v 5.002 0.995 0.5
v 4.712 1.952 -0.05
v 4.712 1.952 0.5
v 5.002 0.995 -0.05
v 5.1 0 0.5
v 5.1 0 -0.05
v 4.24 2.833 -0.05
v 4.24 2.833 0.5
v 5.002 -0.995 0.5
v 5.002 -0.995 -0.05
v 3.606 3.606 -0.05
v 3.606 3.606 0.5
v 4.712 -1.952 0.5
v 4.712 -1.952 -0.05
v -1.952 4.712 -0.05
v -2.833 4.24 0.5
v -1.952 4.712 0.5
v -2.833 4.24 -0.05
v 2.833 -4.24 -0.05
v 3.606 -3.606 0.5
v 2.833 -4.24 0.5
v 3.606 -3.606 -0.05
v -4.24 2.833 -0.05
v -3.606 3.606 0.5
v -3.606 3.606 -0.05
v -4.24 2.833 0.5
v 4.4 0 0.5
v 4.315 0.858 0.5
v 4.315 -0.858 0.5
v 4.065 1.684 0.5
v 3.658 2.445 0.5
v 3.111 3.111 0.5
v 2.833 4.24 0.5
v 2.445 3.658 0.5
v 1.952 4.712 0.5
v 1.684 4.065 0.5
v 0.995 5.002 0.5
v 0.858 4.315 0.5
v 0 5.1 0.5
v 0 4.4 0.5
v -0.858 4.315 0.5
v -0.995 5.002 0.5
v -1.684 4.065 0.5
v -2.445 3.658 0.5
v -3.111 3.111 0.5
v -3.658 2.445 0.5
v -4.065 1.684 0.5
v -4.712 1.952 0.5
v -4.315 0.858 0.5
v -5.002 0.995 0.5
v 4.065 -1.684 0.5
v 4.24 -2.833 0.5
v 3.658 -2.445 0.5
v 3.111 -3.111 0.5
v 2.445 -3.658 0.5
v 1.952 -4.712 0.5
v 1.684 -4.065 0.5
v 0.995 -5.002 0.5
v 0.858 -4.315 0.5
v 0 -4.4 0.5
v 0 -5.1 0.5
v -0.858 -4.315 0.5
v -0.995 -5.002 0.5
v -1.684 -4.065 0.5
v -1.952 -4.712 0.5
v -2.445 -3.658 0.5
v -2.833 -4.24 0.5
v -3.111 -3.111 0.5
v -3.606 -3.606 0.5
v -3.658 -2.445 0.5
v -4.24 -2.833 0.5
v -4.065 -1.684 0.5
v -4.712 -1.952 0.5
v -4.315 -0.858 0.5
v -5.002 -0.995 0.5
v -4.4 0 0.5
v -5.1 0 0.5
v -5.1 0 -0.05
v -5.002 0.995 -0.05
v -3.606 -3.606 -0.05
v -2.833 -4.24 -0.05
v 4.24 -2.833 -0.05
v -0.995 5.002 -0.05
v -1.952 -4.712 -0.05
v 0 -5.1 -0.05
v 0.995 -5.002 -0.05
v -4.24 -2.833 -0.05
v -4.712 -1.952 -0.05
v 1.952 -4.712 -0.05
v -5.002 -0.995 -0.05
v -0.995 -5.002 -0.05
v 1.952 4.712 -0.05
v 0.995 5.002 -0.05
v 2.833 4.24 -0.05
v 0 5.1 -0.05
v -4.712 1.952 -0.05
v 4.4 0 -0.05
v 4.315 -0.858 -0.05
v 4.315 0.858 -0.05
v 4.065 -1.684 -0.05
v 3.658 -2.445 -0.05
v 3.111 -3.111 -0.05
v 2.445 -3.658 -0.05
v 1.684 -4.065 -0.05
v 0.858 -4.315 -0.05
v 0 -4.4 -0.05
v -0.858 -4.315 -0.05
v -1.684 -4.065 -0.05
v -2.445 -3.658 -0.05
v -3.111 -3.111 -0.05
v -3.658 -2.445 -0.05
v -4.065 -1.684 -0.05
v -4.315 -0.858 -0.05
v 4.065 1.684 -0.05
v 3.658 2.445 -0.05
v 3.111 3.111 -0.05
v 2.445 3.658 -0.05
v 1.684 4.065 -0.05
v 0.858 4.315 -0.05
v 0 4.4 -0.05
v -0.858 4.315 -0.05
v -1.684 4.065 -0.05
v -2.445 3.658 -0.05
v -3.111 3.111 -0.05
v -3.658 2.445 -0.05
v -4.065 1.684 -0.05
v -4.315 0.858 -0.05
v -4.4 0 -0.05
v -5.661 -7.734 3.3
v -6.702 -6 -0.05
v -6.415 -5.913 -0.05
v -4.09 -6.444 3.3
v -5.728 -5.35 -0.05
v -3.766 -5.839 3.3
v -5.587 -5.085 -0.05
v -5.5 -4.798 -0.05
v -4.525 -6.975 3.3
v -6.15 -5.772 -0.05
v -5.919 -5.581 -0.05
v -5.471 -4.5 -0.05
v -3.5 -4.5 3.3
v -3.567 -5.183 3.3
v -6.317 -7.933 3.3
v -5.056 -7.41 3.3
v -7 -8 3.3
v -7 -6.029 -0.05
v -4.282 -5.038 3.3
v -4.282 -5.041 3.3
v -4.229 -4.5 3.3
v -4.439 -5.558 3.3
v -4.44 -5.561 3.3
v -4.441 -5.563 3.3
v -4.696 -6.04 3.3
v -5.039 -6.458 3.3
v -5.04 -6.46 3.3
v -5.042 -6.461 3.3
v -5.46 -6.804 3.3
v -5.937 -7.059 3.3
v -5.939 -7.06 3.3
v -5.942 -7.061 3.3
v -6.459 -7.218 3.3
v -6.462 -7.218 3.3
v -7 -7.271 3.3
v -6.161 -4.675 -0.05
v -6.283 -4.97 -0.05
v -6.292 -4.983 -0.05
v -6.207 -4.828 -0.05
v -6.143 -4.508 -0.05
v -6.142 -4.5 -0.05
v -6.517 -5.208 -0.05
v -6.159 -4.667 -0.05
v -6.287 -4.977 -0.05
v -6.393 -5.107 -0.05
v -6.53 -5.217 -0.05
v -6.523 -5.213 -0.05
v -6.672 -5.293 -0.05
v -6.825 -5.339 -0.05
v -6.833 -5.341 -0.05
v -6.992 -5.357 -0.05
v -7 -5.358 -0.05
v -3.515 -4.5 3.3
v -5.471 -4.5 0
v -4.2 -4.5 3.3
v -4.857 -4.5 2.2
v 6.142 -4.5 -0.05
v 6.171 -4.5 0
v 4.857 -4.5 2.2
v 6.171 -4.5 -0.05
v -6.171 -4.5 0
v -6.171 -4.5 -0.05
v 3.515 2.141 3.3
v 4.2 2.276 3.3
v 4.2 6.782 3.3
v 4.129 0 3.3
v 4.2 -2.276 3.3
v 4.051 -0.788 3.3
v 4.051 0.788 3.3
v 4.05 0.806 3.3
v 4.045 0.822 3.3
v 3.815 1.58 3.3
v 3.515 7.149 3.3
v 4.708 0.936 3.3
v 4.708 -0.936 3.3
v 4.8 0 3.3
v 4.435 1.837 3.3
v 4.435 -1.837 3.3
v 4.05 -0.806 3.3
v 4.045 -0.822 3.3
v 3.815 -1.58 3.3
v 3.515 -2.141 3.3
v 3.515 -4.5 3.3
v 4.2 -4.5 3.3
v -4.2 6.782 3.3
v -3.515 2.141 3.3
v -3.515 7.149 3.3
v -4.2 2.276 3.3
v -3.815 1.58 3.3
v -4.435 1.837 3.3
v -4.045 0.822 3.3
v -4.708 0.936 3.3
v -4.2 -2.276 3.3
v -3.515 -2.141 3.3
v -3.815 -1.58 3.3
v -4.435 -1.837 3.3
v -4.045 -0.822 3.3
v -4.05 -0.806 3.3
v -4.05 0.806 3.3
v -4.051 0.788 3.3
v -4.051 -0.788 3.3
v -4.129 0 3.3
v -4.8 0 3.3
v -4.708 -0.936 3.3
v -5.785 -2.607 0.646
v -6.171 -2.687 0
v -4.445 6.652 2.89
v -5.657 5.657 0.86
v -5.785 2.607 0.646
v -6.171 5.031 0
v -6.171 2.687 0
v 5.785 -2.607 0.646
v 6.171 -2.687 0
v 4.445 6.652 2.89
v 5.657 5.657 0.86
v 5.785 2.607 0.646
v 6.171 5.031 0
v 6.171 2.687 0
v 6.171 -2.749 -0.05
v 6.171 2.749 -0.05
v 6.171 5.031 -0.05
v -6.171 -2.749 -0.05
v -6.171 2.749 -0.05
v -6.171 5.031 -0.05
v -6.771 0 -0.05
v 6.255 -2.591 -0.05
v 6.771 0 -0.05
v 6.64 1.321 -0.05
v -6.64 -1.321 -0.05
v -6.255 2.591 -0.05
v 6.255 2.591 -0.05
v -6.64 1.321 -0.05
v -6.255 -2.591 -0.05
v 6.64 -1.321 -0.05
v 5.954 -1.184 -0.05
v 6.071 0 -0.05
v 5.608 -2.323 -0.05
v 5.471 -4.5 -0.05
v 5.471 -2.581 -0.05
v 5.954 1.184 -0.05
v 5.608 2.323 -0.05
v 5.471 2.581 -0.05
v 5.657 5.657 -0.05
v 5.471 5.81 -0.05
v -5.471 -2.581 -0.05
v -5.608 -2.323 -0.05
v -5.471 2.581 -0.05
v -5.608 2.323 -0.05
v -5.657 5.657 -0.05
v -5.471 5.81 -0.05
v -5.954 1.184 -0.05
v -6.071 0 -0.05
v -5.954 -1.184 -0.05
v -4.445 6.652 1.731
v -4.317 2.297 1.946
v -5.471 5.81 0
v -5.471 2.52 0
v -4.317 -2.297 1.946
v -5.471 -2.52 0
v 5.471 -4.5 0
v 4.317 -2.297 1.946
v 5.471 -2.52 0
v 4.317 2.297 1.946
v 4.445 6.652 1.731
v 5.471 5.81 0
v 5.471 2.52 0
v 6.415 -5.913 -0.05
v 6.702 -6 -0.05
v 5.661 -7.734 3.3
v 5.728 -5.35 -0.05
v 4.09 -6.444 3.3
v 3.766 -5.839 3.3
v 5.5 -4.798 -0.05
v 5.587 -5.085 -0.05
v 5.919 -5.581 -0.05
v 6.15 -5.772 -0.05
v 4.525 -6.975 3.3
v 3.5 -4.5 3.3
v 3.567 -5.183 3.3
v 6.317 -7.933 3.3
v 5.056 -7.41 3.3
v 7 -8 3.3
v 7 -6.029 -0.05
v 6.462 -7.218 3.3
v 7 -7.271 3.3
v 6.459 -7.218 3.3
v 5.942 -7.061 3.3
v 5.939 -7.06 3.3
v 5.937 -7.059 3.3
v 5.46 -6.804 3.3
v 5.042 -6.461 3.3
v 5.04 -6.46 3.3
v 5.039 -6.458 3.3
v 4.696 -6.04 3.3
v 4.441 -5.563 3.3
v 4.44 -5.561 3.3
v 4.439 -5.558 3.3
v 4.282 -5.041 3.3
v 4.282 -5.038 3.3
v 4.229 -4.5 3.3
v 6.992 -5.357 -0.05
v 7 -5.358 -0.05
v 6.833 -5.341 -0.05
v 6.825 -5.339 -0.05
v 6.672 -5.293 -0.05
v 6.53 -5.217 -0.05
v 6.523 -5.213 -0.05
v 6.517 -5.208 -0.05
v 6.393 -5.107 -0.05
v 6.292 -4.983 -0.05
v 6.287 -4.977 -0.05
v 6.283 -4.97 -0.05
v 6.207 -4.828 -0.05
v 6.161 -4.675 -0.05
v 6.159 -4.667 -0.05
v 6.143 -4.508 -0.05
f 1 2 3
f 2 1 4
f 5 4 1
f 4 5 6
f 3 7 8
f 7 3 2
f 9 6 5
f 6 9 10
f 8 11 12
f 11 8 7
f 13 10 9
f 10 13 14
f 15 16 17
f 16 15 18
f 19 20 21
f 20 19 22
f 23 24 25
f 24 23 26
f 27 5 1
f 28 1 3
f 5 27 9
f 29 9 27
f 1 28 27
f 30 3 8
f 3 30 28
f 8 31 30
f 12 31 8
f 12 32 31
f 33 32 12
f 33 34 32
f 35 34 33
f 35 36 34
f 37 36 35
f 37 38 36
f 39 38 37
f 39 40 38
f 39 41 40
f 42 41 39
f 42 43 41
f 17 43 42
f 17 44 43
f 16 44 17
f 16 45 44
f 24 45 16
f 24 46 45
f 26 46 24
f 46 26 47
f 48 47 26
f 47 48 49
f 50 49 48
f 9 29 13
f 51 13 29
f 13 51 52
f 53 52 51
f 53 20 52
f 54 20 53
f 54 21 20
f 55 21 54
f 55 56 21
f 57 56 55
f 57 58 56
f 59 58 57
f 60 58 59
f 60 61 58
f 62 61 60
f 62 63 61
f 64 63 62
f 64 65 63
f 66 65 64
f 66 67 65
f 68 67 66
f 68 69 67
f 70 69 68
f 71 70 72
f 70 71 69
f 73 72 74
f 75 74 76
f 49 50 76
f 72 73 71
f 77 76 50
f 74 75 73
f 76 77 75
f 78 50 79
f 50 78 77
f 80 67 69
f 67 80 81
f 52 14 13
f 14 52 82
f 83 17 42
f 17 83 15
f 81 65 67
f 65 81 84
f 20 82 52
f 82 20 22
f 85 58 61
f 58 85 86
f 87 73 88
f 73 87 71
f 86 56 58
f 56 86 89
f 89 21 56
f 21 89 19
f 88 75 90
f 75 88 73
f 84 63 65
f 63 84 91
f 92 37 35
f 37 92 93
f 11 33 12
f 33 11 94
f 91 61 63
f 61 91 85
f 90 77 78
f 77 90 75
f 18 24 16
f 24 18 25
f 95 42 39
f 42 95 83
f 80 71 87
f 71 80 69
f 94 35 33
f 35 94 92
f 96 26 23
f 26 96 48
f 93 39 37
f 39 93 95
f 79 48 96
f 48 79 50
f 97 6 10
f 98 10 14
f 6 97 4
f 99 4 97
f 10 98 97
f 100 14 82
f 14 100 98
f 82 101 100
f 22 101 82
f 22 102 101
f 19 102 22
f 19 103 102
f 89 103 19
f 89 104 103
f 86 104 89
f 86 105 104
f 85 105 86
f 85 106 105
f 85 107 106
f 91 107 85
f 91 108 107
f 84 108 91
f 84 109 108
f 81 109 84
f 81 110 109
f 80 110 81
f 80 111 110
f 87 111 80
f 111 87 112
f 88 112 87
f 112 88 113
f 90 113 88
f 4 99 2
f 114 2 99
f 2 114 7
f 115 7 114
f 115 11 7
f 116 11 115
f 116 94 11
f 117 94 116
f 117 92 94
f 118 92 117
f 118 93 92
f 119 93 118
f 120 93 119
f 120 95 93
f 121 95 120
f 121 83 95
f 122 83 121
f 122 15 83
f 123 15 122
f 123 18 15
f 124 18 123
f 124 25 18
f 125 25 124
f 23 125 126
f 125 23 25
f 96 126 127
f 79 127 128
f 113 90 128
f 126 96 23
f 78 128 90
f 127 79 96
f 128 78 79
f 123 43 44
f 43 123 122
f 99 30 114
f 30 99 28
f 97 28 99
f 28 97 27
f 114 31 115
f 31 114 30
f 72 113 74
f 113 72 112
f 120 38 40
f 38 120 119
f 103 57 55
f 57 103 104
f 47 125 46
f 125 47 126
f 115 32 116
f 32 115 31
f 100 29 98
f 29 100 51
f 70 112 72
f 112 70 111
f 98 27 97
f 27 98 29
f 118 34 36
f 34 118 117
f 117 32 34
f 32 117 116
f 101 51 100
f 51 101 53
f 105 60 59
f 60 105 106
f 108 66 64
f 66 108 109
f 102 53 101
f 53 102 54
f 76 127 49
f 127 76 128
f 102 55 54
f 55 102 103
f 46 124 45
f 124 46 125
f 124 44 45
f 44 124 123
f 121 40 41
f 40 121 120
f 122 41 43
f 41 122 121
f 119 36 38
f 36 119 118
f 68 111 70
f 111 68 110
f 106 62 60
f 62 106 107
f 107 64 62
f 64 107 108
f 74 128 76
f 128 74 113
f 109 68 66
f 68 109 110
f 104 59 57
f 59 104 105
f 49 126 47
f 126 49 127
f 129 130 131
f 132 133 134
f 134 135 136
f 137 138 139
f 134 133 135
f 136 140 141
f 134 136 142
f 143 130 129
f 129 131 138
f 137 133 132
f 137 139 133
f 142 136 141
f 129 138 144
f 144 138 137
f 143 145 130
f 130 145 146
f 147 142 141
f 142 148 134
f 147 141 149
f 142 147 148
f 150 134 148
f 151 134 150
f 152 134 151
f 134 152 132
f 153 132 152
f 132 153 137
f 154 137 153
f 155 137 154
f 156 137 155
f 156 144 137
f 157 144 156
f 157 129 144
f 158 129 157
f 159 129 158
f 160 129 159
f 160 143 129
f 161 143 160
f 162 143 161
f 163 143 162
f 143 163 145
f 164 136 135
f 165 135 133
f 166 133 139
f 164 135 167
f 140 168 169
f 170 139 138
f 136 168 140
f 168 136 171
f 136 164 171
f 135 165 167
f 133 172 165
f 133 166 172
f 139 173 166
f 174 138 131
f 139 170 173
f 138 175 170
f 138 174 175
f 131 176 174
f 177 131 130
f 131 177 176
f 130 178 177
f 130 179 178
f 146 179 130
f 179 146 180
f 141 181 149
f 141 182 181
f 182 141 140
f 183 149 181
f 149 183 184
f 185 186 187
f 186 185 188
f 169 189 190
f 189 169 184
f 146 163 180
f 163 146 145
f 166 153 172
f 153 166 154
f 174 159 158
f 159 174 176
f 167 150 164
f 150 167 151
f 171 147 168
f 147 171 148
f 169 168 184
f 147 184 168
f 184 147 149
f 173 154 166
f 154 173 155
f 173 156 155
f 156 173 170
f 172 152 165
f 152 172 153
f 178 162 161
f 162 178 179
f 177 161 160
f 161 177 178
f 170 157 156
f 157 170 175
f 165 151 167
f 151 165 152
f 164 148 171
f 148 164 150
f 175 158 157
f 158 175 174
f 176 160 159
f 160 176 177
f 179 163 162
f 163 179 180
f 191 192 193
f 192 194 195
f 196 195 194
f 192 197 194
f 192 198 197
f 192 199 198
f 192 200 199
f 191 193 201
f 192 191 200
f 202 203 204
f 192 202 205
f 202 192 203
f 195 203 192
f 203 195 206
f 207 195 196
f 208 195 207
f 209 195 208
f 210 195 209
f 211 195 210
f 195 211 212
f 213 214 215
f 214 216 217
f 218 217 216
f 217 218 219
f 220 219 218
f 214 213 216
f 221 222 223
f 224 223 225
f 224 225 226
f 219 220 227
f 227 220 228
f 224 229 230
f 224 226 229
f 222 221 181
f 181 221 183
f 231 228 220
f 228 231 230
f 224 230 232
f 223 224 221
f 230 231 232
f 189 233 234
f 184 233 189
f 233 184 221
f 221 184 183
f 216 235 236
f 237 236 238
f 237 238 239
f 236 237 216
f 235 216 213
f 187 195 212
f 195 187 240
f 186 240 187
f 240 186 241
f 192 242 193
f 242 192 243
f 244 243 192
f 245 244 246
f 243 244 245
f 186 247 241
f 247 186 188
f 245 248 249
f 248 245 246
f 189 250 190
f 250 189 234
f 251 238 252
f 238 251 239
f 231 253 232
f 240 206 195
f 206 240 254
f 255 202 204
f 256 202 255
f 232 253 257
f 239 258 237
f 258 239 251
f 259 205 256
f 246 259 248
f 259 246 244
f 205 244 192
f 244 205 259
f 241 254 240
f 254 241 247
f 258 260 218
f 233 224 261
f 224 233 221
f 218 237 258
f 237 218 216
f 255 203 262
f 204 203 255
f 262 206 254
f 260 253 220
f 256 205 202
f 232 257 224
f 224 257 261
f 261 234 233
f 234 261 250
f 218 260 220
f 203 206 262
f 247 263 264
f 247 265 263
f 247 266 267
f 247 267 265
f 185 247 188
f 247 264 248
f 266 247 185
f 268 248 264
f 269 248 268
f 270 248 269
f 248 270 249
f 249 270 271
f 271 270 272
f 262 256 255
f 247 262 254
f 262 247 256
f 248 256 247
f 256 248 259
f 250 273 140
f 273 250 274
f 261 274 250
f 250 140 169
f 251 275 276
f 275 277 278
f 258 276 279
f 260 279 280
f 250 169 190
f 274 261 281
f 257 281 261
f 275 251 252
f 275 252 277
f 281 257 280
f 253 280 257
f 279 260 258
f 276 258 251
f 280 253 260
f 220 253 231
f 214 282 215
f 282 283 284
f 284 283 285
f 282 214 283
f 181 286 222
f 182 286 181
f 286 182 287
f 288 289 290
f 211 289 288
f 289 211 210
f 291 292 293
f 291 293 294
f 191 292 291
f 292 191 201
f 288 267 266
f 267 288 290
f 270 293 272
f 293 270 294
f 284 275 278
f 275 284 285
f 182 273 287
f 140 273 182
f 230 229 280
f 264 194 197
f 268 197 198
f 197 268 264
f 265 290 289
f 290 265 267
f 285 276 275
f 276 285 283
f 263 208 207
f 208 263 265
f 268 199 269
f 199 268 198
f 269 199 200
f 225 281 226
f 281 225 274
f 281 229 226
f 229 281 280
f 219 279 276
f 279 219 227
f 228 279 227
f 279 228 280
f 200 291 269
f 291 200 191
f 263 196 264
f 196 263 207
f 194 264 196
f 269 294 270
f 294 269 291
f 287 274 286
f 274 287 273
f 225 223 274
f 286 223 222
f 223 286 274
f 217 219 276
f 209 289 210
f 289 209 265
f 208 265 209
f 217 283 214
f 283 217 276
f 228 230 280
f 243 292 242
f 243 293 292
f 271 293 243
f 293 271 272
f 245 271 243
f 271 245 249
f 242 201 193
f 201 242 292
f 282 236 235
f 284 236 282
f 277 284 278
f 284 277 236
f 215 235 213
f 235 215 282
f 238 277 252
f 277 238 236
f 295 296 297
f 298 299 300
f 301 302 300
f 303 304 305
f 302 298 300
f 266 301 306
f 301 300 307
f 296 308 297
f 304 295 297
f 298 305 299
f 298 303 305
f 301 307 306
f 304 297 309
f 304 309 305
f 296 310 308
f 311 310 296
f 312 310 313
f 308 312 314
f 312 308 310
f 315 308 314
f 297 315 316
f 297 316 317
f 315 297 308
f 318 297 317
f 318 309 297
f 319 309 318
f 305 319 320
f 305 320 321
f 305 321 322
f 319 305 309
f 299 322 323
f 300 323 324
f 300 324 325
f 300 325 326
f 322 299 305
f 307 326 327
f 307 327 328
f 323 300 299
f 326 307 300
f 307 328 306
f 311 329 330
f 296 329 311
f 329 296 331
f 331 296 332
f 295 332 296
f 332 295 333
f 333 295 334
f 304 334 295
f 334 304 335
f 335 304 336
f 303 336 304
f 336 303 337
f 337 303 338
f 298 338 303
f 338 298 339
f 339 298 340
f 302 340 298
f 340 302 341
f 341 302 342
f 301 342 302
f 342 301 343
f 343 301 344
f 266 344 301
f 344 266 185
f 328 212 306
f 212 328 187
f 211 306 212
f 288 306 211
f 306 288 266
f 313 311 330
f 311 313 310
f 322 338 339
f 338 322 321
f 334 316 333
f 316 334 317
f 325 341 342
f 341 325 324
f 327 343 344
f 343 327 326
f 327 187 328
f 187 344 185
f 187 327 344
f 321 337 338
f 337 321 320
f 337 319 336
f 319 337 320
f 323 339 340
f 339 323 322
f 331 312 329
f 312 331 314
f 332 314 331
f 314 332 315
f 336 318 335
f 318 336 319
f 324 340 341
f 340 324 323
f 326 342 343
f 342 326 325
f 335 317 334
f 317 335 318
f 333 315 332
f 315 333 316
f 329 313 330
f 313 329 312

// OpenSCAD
use <utilities.scad>;

$fn=32;
d=0.05;

tube_lens_r=5+0.1;
tube_lens_edge_h=2;
tube_lens_centre_h=4;
gripper_t=1;

body_r=8;
inner_r=body_r-1;
cutout_h=tube_lens_centre_h+1;
roof_r = inner_r-cutout_h+tube_lens_edge_h;
floor_t = 1;

pedestal_h=0.5;
        
module lens_holder(){
    t=0.7; //thickness of wall
    union(){
        //pedestal for lens
        difference(){
            translate([0,0,-d]) cylinder(r=tube_lens_r,h=d+pedestal_h);
            //beam clearance
            cylinder(r=tube_lens_r-t,h=999,center=true); 
        }
        
        //gripper
        m=1.7; //gradient of wall
        tightness=0.5; //how much the lens is squeezed in position
        transient_tightness=0.6; //how much more the lens is squeezed on the way in
        bottom_r=tube_lens_r + (tube_lens_edge_h+pedestal_h)/m -tightness;
        //distance of the bottom of the wall from the centre
        gripper_h=tube_lens_edge_h+pedestal_h+m*0.5; //height of the gripper "wall" (0.5mm above the lens edge)
        dr=gripper_h/m; //distance of top of wall from cavity edge
        reflect([1,0,0]){
            f_bottom_r = inner_r - bottom_r + transient_tightness;
            translate([-inner_r,-body_r+f_bottom_r+dr,-d]) difference(){
                intersection(){
                    cylinder(r1=f_bottom_r,r2=f_bottom_r+dr, h=gripper_h);
                    rotate(-90) cube(999);
                }
                translate([0,0,-d]) cylinder(r1=f_bottom_r-t,
                         r2=f_bottom_r+dr-t, h=gripper_h+2*d);
            }
            intersection(){
                //side wall grippers, incl. rounded bit
                translate([0,0,-d]) cylinder(r=body_r,h=body_r);
                difference(){
                    union(){
                        //straight part of the grippers
                        translate([0,f_bottom_r+dr,-d]) hull(){
                            cube([(bottom_r-transient_tightness)*2+2*t,2*body_r,2*d],center=true);
                            cube([(bottom_r-transient_tightness-dr)*2+2*t,2*body_r,2*gripper_h],center=true);
                        }
                        //curved part of the grippers
                        translate([0,0,-d]) cylinder(r1=bottom_r+t, r2=bottom_r+t+-dr, h=gripper_h);
                    }
                    union(){
                        translate([0,f_bottom_r+dr,-d]) hull(){
                            cube([(bottom_r-transient_tightness)*2,999,2*d],center=true);
                            cube([(bottom_r-transient_tightness-dr)*2,999,2*gripper_h+d],center=true);
                        }
                        translate([0,0,-d]) cylinder(r1=bottom_r, r2=bottom_r+-dr, h=gripper_h+d);
                    }
                }
            }
//            intersection(){
//                cylinder(r=inner_r+d,h=999);
//                hull(){
//                    translate([-7+top_r-0.5,-tube_lens_r+1-d,1.25+tube_lens_edge_h+1-d]) cube([0.5,999,d]);
//                    translate([-7+top_r-0.5-tube_lens_edge_h/2,-tube_lens_r+1-d,1.25-d]) cube([0.5,999,d]);
//                }
//            }
        }
    }
}
module lens() {
    intersection(){
        dh=tube_lens_centre_h-tube_lens_edge_h;
        rs=(pow(dh,2) + pow(tube_lens_r,2))/(2*dh);
        cylinder(r=tube_lens_r,h=999);
        translate([0,0,tube_lens_centre_h-rs]) sphere(r=rs);
    }
}

//gripper();
lens_holder();

%translate([0,0,0.5]) lens();
